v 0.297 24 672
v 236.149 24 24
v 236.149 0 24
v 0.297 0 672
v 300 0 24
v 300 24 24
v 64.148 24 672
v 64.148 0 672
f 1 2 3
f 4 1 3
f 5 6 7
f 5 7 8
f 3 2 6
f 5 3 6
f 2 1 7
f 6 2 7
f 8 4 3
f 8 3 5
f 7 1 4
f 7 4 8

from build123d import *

# Parameters (mm, degrees)
BOX016_W               = 60
BOX016_H               = 24
BOX016_DEPTH           = 827
BOX016_PITCH_ANGLE     = 19.999975
BOX016_PLACEMENT_ANGLE = 180
BOX015_W               = 300
BOX015_H               = 24
BOX015_DEPTH           = 648


with BuildPart() as cube007:
    # Box016 → Box016 (new body)
    with BuildSketch(Plane.XY):
        with Locations((30, 12)):
            Rectangle(BOX016_W, BOX016_H)
    extrude(amount=BOX016_DEPTH)


with BuildPart() as cube007_1:
    # Box016 pitch: moved
    add(cube007.part.rotate(Axis((0, 0, 0), (0, 1, 0)), BOX016_PITCH_ANGLE))


with BuildPart() as cube007_2:
    # Box016 placement: moved
    add(cube007_1.part.moved(Location((300, 24, 24))).rotate(Axis((300, 24, 24), (0, 0, 1)), BOX016_PLACEMENT_ANGLE))


with BuildPart() as stand:
    # Box015 → Box015 (new body)
    with BuildSketch(Plane.XY.offset(24)):
        with Locations((150, 12)):
            Rectangle(BOX015_W, BOX015_H)
    extrude(amount=BOX015_DEPTH)

    # Common: intersect Cube007
    add(cube007_2.part, mode=Mode.INTERSECT)


solid = stand.part
